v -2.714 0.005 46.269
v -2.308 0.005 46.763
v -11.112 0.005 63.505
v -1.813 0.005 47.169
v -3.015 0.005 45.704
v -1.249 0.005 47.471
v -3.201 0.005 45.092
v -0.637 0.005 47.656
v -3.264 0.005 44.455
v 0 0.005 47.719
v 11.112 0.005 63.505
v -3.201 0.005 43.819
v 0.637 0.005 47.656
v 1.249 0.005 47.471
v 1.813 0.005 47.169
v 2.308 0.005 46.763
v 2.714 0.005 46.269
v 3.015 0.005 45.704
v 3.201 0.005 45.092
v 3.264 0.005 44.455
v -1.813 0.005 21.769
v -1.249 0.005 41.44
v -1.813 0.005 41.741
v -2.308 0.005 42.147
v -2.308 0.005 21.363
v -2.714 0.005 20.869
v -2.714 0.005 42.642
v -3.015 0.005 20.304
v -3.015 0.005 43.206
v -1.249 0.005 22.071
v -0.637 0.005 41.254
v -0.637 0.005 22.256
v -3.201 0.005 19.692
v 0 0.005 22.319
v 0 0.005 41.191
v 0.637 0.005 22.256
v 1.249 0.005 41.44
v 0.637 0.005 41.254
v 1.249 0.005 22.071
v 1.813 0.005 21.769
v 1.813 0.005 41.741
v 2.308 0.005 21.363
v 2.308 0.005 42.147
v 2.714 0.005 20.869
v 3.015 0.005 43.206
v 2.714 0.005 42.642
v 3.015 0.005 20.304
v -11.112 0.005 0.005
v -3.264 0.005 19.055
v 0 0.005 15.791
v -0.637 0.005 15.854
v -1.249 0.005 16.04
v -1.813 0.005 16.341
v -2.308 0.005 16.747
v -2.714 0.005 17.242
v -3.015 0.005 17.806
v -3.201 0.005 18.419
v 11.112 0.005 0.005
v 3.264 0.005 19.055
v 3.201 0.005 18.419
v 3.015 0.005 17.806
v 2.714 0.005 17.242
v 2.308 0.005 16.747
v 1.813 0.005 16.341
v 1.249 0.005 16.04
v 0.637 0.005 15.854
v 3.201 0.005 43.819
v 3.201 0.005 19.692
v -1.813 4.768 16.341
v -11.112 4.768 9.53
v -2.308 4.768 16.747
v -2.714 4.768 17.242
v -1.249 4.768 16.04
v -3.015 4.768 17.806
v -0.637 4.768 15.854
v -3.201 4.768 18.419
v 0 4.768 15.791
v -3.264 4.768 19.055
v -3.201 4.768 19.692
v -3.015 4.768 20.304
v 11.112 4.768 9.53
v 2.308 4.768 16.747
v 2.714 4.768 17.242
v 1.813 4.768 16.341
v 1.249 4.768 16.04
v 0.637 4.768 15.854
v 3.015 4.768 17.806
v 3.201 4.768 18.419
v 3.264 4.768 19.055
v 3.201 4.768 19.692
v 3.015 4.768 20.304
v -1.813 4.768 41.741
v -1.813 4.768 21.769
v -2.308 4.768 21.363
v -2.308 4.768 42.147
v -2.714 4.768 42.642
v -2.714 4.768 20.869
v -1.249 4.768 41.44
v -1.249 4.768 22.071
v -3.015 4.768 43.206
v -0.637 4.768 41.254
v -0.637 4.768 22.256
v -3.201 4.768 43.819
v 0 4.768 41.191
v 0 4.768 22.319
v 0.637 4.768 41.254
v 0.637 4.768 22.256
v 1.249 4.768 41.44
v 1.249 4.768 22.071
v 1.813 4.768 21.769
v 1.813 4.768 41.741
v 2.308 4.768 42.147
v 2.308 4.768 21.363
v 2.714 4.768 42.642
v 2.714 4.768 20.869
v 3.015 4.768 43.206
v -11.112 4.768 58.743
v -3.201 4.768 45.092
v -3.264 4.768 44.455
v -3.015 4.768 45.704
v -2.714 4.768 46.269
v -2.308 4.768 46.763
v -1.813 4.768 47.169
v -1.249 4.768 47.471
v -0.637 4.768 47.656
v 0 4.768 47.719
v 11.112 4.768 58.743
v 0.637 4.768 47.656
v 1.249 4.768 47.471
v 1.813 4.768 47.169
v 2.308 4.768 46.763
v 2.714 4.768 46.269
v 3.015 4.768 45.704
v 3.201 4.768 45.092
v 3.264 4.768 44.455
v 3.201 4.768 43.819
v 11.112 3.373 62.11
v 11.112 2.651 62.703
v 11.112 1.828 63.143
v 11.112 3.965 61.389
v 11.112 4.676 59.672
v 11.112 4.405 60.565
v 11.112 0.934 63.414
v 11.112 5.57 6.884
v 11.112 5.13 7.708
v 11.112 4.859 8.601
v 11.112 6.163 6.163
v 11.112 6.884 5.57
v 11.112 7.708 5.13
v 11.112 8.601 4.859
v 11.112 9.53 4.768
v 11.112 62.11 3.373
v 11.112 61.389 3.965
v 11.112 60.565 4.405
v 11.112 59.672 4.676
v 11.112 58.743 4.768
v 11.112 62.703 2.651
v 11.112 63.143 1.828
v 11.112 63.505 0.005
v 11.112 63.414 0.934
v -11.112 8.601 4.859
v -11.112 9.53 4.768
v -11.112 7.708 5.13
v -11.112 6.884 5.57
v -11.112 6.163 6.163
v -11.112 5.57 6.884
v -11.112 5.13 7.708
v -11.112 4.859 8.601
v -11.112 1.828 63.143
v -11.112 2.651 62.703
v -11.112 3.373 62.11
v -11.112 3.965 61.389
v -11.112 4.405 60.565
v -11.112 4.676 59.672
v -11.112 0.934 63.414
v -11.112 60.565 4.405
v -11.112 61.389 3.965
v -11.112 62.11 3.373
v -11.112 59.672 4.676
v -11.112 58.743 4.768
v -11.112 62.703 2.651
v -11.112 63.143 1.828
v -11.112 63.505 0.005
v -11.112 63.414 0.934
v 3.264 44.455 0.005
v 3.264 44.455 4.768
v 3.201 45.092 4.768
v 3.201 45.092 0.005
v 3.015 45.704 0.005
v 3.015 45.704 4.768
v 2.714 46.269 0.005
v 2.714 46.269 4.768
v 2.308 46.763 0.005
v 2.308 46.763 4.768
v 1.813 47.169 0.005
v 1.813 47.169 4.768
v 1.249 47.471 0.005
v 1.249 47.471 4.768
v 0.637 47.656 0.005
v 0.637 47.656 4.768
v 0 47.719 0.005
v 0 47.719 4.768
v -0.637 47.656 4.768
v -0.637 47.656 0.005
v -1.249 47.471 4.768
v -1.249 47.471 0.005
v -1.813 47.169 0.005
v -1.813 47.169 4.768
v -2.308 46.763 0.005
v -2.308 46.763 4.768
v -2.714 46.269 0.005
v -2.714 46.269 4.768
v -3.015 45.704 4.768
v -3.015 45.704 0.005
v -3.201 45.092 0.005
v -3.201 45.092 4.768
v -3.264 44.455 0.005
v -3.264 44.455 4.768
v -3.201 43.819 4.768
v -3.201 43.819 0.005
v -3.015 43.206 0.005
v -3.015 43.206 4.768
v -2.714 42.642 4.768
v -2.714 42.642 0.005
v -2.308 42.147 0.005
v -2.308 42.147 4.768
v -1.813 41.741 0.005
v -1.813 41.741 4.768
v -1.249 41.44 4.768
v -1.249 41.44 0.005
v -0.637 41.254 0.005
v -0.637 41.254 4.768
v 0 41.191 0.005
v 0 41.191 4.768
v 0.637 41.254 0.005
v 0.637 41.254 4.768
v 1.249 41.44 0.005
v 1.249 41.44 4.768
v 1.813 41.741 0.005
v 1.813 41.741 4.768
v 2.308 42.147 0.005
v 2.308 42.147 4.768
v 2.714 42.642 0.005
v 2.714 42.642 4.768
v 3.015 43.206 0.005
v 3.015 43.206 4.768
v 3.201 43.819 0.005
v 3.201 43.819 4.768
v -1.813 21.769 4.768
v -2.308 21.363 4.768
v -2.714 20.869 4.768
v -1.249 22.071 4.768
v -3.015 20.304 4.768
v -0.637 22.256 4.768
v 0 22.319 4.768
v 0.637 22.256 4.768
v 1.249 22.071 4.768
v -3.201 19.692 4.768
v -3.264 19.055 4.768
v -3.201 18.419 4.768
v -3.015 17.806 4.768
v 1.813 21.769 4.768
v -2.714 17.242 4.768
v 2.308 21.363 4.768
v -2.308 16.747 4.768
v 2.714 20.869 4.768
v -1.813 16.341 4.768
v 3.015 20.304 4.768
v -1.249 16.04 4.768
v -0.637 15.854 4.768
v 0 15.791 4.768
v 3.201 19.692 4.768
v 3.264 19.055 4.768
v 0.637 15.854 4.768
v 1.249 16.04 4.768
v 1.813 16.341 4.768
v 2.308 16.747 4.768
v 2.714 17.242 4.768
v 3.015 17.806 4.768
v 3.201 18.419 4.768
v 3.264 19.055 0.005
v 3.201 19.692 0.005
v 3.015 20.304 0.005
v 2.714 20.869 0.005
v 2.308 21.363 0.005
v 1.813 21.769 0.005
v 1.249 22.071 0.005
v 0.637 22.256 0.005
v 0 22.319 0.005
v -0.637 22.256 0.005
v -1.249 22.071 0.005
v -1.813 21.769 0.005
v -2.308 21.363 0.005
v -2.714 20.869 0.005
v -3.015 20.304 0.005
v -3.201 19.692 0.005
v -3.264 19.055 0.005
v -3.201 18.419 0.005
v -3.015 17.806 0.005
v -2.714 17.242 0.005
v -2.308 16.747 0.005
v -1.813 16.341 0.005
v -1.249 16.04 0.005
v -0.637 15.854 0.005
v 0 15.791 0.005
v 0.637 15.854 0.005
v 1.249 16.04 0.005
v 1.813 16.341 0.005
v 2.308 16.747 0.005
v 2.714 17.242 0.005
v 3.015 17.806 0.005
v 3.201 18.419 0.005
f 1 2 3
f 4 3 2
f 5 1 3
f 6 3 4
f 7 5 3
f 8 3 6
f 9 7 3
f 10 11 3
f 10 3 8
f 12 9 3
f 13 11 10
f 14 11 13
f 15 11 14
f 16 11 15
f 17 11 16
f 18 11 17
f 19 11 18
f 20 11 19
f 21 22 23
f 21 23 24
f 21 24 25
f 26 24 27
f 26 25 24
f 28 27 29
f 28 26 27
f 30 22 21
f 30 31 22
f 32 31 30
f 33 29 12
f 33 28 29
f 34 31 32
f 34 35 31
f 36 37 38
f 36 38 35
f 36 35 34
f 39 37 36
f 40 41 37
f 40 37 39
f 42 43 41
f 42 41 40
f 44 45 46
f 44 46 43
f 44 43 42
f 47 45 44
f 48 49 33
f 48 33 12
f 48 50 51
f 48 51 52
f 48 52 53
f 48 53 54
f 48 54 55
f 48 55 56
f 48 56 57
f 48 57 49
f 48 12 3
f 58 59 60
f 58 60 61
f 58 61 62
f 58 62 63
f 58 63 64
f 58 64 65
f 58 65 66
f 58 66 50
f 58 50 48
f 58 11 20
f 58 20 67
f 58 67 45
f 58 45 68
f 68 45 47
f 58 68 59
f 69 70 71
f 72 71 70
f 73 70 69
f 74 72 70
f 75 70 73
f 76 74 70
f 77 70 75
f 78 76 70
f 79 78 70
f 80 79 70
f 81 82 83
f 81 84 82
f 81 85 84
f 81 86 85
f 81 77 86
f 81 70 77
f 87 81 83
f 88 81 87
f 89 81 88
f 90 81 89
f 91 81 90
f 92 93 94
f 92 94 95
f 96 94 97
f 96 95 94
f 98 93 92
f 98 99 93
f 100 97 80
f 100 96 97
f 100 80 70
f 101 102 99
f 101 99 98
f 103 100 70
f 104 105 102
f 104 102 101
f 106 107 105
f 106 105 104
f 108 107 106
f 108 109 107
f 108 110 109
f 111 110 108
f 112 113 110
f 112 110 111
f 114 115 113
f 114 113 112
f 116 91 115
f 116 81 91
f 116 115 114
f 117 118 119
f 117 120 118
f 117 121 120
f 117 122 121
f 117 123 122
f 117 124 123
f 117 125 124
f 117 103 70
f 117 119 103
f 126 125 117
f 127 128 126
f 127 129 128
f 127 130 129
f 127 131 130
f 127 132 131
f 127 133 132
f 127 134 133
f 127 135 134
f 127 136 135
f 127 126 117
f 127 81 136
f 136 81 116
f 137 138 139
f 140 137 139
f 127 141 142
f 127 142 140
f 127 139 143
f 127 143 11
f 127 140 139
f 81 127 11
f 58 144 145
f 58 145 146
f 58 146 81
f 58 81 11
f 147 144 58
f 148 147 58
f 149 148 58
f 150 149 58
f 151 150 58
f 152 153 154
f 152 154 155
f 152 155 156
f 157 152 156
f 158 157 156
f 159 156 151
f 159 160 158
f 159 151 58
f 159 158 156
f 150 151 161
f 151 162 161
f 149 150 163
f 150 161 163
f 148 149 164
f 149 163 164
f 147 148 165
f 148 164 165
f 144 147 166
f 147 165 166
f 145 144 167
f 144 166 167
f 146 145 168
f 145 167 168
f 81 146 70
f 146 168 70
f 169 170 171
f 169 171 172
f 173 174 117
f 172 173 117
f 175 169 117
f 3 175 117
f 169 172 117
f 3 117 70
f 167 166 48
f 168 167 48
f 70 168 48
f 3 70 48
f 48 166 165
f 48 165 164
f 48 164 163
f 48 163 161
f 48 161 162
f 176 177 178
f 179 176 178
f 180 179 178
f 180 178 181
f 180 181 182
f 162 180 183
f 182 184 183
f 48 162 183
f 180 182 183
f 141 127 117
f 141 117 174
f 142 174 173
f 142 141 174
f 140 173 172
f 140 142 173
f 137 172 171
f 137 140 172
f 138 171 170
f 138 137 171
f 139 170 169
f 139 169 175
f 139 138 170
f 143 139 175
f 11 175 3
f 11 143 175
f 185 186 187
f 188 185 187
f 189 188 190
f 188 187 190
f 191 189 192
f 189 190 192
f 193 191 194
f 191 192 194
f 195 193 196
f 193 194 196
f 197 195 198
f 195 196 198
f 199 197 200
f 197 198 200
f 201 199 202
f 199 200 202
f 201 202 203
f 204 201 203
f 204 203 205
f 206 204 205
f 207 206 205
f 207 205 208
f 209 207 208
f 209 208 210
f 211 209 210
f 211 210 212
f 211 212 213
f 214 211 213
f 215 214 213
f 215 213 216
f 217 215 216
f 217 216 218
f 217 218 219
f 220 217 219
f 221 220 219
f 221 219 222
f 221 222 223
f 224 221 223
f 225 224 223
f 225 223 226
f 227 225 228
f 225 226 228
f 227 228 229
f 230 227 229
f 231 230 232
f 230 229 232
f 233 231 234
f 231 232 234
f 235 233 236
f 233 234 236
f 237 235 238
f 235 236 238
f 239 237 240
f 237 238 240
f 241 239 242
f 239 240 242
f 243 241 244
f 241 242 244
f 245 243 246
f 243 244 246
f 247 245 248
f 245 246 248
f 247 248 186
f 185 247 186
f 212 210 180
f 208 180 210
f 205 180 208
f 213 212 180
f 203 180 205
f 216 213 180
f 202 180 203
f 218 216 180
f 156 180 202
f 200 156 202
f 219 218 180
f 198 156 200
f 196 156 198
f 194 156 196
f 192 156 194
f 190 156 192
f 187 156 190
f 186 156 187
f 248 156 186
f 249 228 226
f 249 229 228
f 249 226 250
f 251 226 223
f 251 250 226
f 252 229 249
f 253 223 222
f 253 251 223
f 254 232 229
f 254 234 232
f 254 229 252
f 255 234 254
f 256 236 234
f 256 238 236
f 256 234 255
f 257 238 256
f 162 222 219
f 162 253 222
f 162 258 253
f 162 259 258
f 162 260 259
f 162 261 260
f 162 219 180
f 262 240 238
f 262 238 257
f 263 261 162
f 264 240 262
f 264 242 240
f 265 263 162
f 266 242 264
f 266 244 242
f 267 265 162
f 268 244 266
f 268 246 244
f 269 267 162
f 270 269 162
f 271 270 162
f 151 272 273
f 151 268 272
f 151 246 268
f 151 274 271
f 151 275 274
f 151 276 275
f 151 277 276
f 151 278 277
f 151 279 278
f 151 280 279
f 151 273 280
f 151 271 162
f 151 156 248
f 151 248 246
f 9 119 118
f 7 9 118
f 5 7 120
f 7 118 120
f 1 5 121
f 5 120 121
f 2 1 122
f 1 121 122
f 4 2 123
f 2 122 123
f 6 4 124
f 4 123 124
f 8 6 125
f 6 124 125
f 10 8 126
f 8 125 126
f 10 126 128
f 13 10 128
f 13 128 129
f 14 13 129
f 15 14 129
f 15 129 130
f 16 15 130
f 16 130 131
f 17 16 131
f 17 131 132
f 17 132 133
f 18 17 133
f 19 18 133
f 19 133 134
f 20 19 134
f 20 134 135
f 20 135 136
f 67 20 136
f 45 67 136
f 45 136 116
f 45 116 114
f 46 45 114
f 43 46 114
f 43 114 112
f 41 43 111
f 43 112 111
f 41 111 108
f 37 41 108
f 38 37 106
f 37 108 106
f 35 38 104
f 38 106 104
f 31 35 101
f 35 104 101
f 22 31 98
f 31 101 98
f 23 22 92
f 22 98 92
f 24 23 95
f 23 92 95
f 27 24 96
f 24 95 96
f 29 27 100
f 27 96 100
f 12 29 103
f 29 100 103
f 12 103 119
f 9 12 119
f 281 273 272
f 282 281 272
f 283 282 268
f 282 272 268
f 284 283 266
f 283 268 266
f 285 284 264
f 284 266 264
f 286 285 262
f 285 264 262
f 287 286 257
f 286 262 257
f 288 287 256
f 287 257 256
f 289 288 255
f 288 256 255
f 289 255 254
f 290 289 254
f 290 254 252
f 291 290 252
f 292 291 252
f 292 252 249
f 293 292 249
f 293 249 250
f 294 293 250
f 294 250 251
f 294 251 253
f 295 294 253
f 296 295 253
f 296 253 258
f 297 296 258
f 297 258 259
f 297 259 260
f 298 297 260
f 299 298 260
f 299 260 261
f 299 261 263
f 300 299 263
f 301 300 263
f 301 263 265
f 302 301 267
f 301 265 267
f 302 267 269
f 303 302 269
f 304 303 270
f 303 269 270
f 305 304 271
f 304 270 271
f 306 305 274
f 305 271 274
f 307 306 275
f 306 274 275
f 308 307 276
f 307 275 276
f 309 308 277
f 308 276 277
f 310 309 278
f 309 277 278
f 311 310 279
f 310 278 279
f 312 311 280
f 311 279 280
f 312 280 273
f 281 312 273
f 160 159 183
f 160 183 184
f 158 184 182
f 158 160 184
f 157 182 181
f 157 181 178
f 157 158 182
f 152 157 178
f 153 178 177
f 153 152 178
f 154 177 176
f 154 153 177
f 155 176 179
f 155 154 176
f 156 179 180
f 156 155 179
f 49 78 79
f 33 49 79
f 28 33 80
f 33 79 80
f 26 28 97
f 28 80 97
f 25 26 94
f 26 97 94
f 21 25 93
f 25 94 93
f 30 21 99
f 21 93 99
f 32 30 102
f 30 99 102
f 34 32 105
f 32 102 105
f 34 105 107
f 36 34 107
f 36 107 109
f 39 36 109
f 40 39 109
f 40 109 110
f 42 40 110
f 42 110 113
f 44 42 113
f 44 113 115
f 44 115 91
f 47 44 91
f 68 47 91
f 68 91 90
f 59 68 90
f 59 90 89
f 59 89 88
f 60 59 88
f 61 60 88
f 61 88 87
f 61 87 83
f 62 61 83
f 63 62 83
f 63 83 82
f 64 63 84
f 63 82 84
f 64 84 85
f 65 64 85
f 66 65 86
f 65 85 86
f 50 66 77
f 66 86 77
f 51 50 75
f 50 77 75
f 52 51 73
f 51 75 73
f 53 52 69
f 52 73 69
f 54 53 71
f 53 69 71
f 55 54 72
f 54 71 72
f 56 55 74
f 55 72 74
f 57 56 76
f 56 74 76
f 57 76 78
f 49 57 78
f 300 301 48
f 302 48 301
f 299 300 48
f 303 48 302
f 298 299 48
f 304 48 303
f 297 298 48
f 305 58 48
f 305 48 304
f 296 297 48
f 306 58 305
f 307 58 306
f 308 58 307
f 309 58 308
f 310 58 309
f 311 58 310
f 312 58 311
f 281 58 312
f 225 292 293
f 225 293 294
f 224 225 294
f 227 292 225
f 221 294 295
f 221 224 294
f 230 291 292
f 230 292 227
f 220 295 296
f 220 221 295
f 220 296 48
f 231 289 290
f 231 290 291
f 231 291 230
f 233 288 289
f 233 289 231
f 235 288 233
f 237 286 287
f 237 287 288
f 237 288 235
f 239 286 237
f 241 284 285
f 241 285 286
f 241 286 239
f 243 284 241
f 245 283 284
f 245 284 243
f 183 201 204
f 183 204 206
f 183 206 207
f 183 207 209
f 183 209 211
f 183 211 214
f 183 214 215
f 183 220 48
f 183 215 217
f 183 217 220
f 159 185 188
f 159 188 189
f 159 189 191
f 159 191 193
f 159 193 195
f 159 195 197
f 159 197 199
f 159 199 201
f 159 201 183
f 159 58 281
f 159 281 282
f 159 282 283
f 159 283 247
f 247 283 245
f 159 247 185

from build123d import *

# Parameters (mm, degrees)
BOSS_EXTRUDE1_DEPTH      = 22.225
M6_CLEARANCE_HOLE1_D     = 6.5278
M6_CLEARANCE_HOLE1_DEPTH = 63.5
M6_CLEARANCE_HOLE2_D     = 6.5278
M6_CLEARANCE_HOLE2_DEPTH = 63.5
FILLET1_R                = 4.7625


with BuildPart() as part:
    # Sketch1 → Boss-Extrude1 (new body)
    with BuildSketch(Plane(origin=(11.1125, 0, 0), x_dir=(0, 0, -1), z_dir=(1, 0, 0))):
        with BuildLine():
            Line((-4.767789963, 58.742792373), (-4.767789963, 4.767792373))
            Line((-4.767789963, 4.767792373), (-58.742789963, 4.767792373))
            ThreePointArc((-58.742789963, 4.767792373), (-62.110386009, 3.372888418), (-63.505289963, 0.005292373))
            Line((-63.505289963, 0.005292373), (-0.005289963, 0.005292373))
            Line((-0.005289963, 0.005292373), (-0.005289963, 63.505292373))
            ThreePointArc((-0.005289963, 63.505292373), (-3.372886009, 62.110388418), (-4.767789963, 58.742792373))
        make_face()
    extrude(amount=-BOSS_EXTRUDE1_DEPTH)

    # M6 Clearance Hole1
    with Locations(Plane.XZ.offset(-0.005292373)):
        with Locations((0, 19.055289963), (0, 44.455289963)):
            Hole(M6_CLEARANCE_HOLE1_D / 2, depth=M6_CLEARANCE_HOLE1_DEPTH)

    # M6 Clearance Hole2
    with Locations(Plane(origin=(0, 0, 0.005289963), x_dir=(-1, 0, 0), z_dir=(0, 0, -1))):
        with Locations((0, 19.055292373), (0, 44.455292373)):
            Hole(M6_CLEARANCE_HOLE2_D / 2, depth=M6_CLEARANCE_HOLE2_DEPTH)

    # Fillet1
    fillet1_edges = [part.edges().sort_by_distance(p)[0] for p in [
        (0, 4.767792373, 4.767789963),
    ]]
    fillet(fillet1_edges, radius=FILLET1_R)


solid = part.part
